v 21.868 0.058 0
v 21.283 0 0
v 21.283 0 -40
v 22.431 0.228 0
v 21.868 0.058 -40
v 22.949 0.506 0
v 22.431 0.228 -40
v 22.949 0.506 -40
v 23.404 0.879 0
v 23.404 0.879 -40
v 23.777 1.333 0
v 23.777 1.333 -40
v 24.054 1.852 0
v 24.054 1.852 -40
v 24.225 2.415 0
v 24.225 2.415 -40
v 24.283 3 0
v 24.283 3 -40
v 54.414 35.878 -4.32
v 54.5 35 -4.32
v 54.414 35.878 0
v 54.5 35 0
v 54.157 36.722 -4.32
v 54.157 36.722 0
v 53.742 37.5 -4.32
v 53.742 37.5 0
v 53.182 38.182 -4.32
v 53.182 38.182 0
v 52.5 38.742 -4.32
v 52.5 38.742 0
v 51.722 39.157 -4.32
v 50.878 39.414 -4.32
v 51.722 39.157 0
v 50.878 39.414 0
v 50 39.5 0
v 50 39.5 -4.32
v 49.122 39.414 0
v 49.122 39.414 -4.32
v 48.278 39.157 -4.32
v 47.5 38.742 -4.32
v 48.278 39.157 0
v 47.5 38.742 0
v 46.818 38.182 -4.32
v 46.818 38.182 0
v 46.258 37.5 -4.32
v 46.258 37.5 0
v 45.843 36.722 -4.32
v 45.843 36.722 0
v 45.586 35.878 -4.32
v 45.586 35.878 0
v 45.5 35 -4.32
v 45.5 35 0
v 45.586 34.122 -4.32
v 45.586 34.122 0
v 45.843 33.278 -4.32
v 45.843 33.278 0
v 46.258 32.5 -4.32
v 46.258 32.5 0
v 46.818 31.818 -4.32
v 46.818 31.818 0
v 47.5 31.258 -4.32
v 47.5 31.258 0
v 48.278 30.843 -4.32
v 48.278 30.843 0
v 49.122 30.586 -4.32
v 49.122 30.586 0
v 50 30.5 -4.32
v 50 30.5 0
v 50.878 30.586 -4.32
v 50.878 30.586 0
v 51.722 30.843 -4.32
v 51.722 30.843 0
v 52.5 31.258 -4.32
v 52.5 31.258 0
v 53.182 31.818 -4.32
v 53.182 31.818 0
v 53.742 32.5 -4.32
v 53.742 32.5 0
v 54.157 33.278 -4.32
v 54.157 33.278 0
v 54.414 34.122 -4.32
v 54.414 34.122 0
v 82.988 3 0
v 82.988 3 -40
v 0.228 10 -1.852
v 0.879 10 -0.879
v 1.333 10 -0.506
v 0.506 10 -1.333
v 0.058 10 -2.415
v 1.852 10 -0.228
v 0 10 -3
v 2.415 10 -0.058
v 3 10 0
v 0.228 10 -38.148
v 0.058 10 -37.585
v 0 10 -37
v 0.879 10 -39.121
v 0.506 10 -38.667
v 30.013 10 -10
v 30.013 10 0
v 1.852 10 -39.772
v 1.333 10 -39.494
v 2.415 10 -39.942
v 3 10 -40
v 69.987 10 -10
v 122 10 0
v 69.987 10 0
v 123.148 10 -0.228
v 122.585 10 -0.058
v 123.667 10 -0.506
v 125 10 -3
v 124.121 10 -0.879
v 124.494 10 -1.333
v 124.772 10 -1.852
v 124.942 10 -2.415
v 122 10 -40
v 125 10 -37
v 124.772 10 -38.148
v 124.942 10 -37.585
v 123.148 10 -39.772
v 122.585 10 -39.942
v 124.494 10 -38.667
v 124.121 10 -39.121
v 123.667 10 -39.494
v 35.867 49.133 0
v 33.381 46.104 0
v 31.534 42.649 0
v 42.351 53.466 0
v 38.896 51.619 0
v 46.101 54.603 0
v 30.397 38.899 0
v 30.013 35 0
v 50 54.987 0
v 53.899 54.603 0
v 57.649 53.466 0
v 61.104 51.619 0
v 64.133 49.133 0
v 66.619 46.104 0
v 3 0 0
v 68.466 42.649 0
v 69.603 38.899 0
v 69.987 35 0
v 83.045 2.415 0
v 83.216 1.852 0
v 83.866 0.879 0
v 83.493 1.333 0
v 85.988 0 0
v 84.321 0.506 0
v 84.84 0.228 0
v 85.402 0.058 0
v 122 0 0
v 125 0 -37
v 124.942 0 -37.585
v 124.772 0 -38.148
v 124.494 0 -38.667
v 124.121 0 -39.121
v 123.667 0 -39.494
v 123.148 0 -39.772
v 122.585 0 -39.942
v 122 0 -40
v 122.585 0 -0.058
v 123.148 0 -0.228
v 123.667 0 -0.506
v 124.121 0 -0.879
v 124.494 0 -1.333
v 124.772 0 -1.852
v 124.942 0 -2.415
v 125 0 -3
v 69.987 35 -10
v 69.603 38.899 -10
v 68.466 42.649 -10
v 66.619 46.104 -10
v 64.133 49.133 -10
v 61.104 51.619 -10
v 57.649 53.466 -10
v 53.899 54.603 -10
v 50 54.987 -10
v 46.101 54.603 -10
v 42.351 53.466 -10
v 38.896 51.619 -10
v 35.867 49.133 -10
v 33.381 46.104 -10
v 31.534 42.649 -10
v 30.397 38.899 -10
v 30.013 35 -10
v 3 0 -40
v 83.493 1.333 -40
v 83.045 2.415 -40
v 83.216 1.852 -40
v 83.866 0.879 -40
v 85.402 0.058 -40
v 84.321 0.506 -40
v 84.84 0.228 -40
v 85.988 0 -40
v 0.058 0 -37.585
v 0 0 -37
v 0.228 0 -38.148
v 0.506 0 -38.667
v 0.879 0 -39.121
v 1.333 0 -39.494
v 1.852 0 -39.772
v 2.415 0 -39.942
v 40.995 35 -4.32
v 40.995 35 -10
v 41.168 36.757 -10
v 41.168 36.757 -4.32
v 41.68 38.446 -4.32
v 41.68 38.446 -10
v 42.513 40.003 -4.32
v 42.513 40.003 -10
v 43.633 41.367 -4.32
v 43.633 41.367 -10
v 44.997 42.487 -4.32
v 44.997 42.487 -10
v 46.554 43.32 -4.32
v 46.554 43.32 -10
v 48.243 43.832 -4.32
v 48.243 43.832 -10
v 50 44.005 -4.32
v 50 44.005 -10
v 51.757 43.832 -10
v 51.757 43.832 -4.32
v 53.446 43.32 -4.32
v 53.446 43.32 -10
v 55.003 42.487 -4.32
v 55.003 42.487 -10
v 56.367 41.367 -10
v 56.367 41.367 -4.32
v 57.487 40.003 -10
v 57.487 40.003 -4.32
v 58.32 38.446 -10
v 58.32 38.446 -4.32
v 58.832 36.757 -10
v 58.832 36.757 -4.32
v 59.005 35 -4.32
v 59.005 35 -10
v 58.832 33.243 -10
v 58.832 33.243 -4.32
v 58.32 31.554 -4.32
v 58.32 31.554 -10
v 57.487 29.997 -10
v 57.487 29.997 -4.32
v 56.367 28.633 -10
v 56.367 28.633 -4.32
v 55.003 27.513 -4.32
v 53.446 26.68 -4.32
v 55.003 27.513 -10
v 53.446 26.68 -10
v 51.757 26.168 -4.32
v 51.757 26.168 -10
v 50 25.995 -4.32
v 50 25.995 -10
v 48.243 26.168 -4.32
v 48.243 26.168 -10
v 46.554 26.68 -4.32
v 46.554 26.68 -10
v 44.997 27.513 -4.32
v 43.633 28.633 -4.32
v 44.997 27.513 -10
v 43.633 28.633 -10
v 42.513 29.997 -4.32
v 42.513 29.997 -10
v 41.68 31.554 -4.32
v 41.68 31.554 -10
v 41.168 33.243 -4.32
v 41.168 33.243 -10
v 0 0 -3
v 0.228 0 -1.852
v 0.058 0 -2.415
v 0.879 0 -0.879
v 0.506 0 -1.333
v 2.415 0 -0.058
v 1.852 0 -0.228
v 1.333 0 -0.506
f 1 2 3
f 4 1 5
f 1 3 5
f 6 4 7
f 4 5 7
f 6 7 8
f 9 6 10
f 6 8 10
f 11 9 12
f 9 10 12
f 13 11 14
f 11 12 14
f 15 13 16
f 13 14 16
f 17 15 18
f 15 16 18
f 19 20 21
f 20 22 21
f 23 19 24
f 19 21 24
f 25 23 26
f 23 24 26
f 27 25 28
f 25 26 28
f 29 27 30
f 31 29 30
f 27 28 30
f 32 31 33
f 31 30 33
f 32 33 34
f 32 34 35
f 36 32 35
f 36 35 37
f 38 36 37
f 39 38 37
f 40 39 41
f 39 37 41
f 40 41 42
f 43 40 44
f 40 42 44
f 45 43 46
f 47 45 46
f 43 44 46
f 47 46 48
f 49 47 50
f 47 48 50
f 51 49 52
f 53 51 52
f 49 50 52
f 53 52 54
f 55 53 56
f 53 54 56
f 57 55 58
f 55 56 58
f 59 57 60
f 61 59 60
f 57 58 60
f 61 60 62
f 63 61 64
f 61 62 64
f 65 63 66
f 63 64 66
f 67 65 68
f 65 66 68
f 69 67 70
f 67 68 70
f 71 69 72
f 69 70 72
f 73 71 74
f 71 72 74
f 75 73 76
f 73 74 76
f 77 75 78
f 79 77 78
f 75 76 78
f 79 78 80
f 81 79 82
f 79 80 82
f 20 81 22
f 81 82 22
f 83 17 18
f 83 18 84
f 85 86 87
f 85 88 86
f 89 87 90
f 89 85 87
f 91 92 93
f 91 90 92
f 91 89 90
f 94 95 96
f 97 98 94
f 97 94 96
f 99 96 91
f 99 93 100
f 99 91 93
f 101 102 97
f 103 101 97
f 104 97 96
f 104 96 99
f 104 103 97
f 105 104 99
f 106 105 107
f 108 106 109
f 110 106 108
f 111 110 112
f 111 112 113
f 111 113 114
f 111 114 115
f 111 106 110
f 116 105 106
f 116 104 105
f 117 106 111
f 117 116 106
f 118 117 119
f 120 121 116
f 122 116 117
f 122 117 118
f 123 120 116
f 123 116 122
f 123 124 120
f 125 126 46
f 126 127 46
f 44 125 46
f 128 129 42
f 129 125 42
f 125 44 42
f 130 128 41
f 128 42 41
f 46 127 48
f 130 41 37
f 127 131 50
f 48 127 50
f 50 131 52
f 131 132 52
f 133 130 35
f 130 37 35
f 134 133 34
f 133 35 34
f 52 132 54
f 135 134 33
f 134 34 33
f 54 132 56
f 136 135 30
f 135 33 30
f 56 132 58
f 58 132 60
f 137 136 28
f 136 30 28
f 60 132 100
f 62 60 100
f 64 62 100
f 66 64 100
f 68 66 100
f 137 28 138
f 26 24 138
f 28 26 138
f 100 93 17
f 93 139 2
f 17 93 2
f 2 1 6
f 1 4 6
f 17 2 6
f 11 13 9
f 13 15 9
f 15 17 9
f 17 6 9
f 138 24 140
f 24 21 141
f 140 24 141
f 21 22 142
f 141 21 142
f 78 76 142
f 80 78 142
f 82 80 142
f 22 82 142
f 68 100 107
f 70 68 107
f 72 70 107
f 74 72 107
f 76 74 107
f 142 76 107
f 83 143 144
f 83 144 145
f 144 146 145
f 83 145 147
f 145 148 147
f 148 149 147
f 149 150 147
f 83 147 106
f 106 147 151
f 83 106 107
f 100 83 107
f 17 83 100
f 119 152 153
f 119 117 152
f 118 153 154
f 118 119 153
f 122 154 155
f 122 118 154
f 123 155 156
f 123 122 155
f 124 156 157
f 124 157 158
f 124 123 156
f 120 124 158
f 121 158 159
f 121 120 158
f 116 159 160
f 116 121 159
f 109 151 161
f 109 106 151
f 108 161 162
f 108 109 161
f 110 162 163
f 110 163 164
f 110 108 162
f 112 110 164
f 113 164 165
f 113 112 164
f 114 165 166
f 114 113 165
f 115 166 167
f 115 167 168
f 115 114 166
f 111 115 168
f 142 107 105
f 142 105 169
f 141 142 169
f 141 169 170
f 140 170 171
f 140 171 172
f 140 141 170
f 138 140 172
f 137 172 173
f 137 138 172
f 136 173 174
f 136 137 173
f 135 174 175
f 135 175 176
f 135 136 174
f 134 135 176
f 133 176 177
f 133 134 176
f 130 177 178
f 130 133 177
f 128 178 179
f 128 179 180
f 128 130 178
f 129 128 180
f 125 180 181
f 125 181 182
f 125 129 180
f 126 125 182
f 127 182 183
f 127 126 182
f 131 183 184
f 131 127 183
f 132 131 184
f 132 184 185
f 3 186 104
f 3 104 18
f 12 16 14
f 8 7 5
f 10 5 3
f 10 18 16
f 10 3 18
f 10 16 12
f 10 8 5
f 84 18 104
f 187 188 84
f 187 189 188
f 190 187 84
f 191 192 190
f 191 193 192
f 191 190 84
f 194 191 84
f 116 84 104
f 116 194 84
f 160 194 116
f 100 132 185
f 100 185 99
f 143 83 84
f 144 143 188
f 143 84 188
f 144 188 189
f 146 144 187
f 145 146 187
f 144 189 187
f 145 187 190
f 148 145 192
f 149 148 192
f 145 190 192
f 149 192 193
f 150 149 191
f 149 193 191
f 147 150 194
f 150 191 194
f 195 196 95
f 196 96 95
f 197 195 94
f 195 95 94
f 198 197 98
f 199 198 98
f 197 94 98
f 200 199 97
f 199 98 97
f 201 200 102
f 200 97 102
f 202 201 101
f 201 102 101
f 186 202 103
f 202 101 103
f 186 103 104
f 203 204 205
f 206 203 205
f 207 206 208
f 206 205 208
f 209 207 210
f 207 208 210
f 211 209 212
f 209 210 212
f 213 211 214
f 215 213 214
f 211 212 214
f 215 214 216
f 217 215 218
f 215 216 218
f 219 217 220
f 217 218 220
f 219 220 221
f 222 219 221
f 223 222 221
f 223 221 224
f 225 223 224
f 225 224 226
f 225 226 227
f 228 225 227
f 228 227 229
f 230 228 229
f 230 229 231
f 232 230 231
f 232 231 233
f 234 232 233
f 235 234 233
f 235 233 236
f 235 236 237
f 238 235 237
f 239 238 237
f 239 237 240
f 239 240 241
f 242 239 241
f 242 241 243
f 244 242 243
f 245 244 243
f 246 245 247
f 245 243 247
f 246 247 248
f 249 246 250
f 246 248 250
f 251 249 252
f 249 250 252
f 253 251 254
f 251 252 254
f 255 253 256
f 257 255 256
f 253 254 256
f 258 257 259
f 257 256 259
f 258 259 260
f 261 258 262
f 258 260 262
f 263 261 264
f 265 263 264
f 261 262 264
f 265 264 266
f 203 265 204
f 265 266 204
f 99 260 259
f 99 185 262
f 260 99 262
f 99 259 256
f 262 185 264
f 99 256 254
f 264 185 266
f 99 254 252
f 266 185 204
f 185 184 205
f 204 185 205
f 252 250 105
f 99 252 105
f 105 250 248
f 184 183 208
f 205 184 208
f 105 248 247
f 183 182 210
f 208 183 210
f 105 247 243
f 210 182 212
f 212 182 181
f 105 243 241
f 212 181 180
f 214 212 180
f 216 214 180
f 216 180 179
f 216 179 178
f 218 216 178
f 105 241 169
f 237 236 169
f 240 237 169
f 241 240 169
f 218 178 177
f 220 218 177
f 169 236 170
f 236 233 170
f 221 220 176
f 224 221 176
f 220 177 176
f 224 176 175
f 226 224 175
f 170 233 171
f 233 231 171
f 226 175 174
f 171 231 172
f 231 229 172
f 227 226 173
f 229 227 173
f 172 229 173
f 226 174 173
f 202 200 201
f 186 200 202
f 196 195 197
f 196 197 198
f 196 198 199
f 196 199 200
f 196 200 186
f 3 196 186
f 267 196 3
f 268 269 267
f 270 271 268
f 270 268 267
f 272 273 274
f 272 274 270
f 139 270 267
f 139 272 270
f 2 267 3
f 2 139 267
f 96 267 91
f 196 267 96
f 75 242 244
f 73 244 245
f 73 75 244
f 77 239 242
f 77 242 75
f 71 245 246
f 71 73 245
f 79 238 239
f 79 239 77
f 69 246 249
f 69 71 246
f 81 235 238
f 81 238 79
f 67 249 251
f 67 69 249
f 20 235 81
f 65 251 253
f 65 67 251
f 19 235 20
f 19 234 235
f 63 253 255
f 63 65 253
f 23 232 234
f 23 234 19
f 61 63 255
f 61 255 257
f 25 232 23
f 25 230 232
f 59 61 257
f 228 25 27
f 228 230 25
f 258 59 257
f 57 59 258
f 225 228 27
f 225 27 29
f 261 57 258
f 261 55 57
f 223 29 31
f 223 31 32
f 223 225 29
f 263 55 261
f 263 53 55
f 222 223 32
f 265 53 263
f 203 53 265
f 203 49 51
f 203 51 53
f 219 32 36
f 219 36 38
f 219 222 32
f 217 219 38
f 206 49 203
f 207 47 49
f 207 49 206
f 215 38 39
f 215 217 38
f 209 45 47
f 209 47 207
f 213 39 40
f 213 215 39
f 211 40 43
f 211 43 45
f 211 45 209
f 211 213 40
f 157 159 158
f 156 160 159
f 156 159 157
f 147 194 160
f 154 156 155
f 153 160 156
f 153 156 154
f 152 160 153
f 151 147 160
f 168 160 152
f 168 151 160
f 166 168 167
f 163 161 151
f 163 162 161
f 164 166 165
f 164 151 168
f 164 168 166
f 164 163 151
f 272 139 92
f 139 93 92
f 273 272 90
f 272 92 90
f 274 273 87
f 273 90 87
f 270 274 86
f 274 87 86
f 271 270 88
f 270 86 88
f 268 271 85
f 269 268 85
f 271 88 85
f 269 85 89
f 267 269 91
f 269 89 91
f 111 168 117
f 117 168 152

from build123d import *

# Parameters (mm, degrees)
SKETCH1_W                               = 125
SKETCH1_H                               = 40
BOSS_EXTRUDE1_DEPTH                     = 10
BOSS_EXTRUDE2_DEPTH                     = 10
SKETCH9_W                               = 58.70504164
SKETCH9_H                               = 3.000259145
CUT_EXTRUDE1_DEPTH                      = 67
FILLET1_R                               = 3
FILLET2_R                               = 3
CBORE_FOR_M8_HEX_HEAD_BOLT1_D           = 9
CBORE_FOR_M8_HEX_HEAD_BOLT1_CBORE_D     = 18.01
CBORE_FOR_M8_HEX_HEAD_BOLT1_CBORE_DEPTH = 5.68


with BuildPart() as part:
    # Sketch1 → Boss-Extrude1 (new body)
    with BuildSketch(Plane(origin=(0, 0, 0), x_dir=(1, 0, 0), z_dir=(0, 1, 0))):
        with Locations((62.5, 20)):
            Rectangle(SKETCH1_W, SKETCH1_H)
    extrude(amount=BOSS_EXTRUDE1_DEPTH)

    # Sketch4 → Boss-Extrude2 (add)
    with BuildSketch(Plane.XY):
        with BuildLine():
            Line((30.012948081, 0), (69.987051919, 0))
            Line((69.987051919, 0), (69.987051919, 35))
            ThreePointArc((69.987051919, 35), (50, 54.987051919), (30.012948081, 35))
            Line((30.012948081, 35), (30.012948081, 0))
        make_face()
    extrude(amount=-BOSS_EXTRUDE2_DEPTH)

    # Sketch9 → Cut-Extrude1 (cut)
    with BuildSketch(Plane.XY):
        with Locations((53.635144719, 1.500129573)):
            Rectangle(SKETCH9_W, SKETCH9_H)
    extrude(amount=-CUT_EXTRUDE1_DEPTH, mode=Mode.SUBTRACT)

    # Fillet1
    fillet1_edges = [part.edges().sort_by_distance(p)[0] for p in [
        (0, 5, 0),
        (125, 5, 0),
        (125, 5, -40),
        (0, 5, -40),
    ]]
    fillet(fillet1_edges, radius=FILLET1_R)

    # Fillet2
    fillet2_edges = [part.edges().sort_by_distance(p)[0] for p in [
        (82.987665539, 0, -20),
        (24.282623899, 0, -20),
    ]]
    fillet(fillet2_edges, radius=FILLET2_R)

    # CBORE for M8 Hex Head Bolt1 (through all)
    with Locations(Plane(origin=(50, 35, -10), x_dir=(-1, 0, 0), z_dir=(0, 0, -1))):
        with Locations((0, 0)):
            CounterBoreHole(CBORE_FOR_M8_HEX_HEAD_BOLT1_D / 2, CBORE_FOR_M8_HEX_HEAD_BOLT1_CBORE_D / 2, CBORE_FOR_M8_HEX_HEAD_BOLT1_CBORE_DEPTH)


solid = part.part
